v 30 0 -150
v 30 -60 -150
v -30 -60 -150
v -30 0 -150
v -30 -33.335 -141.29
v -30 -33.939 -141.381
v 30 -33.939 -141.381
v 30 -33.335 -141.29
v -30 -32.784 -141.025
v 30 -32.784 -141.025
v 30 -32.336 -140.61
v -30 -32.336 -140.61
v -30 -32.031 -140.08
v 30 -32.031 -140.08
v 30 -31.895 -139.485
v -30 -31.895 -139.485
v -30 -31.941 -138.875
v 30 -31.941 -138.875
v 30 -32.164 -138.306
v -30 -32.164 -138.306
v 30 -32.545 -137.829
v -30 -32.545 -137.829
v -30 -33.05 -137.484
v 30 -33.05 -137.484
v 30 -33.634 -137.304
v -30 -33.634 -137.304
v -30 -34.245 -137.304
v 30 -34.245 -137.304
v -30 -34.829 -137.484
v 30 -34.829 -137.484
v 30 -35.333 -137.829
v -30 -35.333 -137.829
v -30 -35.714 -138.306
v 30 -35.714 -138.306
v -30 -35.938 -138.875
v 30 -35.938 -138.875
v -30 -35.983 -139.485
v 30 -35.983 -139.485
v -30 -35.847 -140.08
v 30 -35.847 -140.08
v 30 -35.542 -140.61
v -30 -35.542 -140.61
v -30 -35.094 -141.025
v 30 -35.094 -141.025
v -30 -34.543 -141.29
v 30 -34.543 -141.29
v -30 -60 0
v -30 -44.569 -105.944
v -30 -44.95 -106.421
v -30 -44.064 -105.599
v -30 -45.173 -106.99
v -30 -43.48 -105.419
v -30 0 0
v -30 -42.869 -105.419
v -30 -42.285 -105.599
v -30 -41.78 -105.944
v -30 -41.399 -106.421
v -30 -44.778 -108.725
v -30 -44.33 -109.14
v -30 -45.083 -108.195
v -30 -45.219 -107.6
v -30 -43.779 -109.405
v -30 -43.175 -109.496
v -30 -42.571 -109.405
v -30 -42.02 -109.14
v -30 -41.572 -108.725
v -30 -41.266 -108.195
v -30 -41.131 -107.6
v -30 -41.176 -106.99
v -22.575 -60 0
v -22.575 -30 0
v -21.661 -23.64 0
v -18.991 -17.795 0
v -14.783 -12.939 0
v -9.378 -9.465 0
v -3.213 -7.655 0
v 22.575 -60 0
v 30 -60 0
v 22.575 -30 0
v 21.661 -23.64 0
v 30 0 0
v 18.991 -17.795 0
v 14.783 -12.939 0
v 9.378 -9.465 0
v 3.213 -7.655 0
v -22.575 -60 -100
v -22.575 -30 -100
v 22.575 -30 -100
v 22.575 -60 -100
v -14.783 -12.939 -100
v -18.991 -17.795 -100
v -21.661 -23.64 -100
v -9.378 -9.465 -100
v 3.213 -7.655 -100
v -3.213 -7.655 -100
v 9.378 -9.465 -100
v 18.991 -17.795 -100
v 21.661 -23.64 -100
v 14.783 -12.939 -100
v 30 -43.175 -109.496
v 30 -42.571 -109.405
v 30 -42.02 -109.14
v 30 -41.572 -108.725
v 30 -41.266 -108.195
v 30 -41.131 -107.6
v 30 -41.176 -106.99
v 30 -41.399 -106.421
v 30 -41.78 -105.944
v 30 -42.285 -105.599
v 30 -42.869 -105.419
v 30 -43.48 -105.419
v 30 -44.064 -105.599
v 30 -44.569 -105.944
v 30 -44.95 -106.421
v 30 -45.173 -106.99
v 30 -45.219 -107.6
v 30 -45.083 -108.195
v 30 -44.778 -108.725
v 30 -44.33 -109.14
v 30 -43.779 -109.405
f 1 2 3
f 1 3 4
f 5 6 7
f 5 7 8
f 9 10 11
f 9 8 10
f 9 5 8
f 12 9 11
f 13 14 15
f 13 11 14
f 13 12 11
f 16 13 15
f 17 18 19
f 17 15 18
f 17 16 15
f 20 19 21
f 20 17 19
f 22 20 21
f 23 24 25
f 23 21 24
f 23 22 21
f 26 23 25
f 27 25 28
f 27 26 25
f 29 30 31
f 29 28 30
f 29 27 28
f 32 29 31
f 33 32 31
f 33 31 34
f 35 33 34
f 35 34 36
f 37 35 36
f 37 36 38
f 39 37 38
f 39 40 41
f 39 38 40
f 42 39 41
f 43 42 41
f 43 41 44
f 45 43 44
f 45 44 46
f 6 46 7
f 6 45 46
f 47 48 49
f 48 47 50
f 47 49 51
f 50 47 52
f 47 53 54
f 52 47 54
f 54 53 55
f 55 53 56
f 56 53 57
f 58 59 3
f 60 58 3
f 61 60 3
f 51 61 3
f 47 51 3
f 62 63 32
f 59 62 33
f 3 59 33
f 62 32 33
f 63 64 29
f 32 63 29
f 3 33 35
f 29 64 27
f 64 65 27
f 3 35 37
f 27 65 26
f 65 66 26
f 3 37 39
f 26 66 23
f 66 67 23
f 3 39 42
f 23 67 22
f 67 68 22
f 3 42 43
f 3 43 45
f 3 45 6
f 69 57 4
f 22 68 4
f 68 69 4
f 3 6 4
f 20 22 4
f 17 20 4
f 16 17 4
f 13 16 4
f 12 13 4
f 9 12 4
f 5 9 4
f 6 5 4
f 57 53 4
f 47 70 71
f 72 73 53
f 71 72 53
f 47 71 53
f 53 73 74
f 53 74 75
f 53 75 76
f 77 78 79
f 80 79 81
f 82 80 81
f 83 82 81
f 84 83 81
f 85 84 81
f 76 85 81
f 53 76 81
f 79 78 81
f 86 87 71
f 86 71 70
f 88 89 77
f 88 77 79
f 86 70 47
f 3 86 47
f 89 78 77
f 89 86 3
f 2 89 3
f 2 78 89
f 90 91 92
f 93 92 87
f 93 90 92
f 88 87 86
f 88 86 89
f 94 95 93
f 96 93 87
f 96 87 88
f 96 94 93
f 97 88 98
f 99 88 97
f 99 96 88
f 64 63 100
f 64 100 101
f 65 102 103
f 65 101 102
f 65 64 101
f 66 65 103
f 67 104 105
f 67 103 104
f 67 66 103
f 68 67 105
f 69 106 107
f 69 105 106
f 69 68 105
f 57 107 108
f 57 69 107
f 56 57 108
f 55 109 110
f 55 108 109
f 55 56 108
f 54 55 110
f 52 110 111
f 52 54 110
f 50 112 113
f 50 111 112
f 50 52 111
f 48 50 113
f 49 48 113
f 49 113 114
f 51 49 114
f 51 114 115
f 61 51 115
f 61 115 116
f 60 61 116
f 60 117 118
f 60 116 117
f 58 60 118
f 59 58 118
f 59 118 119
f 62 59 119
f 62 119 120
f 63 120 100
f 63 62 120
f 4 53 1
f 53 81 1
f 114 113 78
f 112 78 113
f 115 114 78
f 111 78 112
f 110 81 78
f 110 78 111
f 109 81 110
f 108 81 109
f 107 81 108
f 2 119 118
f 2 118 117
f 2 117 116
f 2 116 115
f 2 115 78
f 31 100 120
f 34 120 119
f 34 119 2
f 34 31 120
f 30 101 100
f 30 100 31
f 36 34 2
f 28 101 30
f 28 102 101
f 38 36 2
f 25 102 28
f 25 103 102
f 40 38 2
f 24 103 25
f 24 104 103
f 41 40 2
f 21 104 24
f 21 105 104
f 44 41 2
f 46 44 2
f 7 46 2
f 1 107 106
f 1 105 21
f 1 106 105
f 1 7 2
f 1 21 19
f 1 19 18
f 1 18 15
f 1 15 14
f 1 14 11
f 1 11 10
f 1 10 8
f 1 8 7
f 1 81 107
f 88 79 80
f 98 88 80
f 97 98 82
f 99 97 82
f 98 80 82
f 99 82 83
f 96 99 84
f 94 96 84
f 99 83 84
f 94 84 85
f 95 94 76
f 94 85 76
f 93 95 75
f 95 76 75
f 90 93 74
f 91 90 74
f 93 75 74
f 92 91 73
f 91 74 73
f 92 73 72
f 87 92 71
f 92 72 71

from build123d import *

# Parameters (mm, degrees)
SKETCH_1_W               = 150
SKETCH_1_H               = 60
EXTRUDE_1_DEPTH          = 30
CUT_EXTRUDE_1_DEPTH      = 100
CUT_EXTRUDE_2_DEPTH      = 165.316767252
CUT_EXTRUDE_2_DEPTH_BACK = 165.316767252
SKETCH_5_R               = 2.05


with BuildPart() as part:
    # 스케치1 → 보스-돌출1 (new, symmetric)
    with BuildSketch(Plane(origin=(0, 0, 0), x_dir=(0, 0, -1), z_dir=(1, 0, 0))):
        with Locations((75, -30)):
            Rectangle(SKETCH_1_W, SKETCH_1_H)
    extrude(amount=EXTRUDE_1_DEPTH, both=True)

    # 스케치4 → 컷-돌출1 (cut)
    with BuildSketch(Plane.XY):
        with BuildLine():
            Line((-22.575, -30), (-22.575, -60))
            Line((-22.575, -60), (22.575, -60))
            Line((22.575, -60), (22.575, -30))
            ThreePointArc((22.575, -30), (0, -7.425), (-22.575, -30))
        make_face()
    extrude(amount=-CUT_EXTRUDE_1_DEPTH, mode=Mode.SUBTRACT)

    # 스케치5 → 컷-돌출2 (cut, two sides: drawn at the far end of the back side and taken through both)
    with BuildSketch(Plane(origin=(0, 0, 0), x_dir=(0, 0, -1), z_dir=(1, 0, 0)).offset(-CUT_EXTRUDE_2_DEPTH_BACK)):
        with Locations((107.446436282, -43.174787846)):
            Circle(SKETCH_5_R)
        with Locations((139.331395941, -33.939123257)):
            Circle(SKETCH_5_R)
    extrude(amount=CUT_EXTRUDE_2_DEPTH + CUT_EXTRUDE_2_DEPTH_BACK, mode=Mode.SUBTRACT)


solid = part.part
